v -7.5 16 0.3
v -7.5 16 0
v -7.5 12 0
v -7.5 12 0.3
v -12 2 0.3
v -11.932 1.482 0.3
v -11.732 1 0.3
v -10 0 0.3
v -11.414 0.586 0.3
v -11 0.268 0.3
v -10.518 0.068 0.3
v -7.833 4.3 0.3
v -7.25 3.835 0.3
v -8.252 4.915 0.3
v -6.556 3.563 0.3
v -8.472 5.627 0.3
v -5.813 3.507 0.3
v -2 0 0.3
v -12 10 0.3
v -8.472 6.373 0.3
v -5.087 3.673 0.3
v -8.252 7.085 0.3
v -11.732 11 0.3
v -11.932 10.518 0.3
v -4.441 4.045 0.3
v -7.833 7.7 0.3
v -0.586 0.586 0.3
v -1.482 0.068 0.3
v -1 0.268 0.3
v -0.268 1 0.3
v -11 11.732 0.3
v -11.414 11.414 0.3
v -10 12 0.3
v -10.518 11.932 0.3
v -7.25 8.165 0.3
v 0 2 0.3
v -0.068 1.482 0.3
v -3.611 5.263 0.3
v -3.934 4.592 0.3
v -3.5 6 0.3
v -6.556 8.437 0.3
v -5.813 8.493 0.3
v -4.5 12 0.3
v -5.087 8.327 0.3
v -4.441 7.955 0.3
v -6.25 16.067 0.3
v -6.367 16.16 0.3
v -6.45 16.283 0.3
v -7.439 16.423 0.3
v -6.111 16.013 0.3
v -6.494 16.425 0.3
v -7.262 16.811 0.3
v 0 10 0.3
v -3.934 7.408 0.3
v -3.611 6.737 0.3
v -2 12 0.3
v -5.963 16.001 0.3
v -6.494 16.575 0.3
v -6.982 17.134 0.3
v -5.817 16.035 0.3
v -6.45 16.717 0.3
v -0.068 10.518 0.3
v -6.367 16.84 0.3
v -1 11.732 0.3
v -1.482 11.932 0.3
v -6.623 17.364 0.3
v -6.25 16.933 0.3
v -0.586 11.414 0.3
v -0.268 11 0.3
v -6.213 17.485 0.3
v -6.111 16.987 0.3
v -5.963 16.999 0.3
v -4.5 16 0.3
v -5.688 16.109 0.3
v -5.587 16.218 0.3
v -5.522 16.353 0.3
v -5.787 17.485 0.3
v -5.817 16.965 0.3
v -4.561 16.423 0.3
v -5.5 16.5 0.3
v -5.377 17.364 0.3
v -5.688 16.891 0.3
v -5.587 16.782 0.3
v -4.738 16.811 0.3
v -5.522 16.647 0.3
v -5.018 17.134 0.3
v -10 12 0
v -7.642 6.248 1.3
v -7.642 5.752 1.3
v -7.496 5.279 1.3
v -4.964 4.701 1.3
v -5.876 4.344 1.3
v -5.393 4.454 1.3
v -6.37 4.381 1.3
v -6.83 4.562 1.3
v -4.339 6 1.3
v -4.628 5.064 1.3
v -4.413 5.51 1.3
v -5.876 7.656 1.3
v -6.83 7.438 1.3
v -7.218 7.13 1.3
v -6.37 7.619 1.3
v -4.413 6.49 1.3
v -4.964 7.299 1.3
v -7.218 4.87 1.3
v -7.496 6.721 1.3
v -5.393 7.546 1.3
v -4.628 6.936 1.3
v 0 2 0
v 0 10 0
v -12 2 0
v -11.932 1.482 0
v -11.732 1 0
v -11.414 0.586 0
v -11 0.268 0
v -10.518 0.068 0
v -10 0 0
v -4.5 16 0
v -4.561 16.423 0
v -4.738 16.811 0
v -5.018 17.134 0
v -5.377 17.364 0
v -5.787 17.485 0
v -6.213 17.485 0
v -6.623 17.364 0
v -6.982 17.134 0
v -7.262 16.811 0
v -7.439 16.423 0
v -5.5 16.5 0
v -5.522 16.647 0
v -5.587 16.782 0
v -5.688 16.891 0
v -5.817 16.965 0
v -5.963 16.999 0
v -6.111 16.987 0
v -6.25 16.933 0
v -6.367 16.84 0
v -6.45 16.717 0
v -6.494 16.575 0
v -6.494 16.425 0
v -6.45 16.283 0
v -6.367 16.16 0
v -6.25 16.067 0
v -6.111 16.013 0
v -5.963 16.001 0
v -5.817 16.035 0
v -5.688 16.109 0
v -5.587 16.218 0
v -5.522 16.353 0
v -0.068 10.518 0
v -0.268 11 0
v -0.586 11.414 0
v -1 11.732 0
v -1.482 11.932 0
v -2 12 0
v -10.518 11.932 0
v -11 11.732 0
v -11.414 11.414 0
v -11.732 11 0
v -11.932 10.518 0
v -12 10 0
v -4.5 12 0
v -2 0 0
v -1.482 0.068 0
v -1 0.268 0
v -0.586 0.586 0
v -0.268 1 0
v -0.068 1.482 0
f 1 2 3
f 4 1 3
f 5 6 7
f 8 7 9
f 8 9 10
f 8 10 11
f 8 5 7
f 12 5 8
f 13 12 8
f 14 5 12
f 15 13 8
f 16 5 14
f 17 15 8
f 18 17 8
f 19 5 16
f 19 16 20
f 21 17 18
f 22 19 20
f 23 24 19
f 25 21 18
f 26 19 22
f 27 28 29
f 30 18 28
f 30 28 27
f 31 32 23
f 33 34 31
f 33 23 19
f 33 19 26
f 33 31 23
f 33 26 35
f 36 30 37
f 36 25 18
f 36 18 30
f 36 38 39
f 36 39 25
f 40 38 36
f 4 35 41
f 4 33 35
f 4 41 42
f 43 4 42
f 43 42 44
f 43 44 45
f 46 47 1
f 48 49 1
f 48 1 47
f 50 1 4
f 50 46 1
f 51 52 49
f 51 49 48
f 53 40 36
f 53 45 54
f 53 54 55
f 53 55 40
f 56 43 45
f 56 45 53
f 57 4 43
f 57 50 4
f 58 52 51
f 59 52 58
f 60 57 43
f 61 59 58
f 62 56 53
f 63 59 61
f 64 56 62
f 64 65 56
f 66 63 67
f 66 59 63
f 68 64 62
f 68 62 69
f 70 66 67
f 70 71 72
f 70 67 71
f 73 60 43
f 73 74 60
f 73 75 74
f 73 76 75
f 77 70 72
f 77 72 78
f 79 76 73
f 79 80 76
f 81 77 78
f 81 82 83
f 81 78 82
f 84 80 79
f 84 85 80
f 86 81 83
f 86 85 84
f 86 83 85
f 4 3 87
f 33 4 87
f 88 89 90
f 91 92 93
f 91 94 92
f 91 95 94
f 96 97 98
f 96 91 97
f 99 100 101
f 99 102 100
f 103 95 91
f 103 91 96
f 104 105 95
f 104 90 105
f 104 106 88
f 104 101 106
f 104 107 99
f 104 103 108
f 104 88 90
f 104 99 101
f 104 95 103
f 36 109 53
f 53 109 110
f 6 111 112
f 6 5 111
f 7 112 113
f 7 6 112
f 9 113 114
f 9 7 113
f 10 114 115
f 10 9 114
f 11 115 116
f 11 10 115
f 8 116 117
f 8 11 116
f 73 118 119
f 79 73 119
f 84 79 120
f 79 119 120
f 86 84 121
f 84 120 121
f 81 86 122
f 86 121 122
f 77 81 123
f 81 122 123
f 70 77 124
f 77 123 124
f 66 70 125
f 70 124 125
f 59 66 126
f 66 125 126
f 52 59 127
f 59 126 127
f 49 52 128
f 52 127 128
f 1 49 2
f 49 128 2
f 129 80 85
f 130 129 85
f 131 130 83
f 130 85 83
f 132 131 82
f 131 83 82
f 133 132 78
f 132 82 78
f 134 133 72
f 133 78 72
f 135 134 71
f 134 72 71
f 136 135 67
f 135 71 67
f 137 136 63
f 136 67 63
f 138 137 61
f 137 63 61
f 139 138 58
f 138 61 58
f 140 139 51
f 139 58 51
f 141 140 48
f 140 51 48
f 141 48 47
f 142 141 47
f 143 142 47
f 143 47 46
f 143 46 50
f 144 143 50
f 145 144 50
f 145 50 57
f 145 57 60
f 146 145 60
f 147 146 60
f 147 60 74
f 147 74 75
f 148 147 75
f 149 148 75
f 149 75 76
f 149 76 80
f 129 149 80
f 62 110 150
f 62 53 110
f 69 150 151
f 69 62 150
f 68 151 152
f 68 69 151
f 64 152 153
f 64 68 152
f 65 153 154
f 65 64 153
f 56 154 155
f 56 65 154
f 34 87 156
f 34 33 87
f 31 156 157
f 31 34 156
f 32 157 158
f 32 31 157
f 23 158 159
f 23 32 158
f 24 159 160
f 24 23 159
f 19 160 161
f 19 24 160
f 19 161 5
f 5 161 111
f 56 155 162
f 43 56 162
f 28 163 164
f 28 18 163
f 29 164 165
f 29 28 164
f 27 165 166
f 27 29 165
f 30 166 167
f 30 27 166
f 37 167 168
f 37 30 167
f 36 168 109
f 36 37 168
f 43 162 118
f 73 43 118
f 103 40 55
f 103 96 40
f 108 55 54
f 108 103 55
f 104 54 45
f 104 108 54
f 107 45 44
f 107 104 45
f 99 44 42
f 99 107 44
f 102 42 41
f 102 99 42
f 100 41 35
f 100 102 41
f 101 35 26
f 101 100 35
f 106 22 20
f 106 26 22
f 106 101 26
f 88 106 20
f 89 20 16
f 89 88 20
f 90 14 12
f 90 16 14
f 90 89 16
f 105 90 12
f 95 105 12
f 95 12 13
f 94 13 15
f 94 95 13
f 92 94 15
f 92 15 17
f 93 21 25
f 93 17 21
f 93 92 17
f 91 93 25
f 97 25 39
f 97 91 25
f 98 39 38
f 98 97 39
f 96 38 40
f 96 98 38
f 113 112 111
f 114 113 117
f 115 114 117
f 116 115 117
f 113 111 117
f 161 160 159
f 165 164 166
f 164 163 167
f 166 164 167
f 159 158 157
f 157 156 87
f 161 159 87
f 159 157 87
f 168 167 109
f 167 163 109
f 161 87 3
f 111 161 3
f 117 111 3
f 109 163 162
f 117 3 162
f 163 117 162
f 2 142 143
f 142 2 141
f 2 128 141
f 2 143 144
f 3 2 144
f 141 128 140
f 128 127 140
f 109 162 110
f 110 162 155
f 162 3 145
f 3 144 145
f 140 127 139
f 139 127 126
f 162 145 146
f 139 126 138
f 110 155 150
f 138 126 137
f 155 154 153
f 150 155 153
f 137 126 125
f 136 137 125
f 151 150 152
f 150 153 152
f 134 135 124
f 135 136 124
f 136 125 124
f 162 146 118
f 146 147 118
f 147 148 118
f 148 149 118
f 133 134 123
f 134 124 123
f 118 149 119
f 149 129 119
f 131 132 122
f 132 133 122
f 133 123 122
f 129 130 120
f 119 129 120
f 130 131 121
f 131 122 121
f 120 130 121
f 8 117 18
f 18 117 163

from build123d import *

# Parameters (mm, degrees)
EXTRUDE_1_DEPTH     = 0.3
FILLET_1_R          = 2
SKETCH_2_R          = 2.5
EXTRUDE_2_DEPTH     = 1
EXTRUDE_2_TAPER     = 40
SKETCH_3_R          = 0.5
CUT_EXTRUDE_1_DEPTH = 1


with BuildPart() as part:
    # 草图1 → 凸台-拉伸1 (new body)
    with BuildSketch(Plane.XY):
        with BuildLine():
            Line((-7.5, 12), (-12, 12))
            Line((-12, 12), (-12, 0))
            Line((-12, 0), (0, 0))
            Line((0, 0), (0, 12))
            Line((0, 12), (-4.5, 12))
            Line((-4.5, 12), (-4.5, 16))
            ThreePointArc((-4.5, 16), (-6, 17.5), (-7.5, 16))
            Line((-7.5, 16), (-7.5, 12))
        make_face()
    extrude(amount=EXTRUDE_1_DEPTH)

    # 圆角1
    fillet_1_edges = [part.edges().sort_by_distance(p)[0] for p in [
        (0, 0, 0.15),
        (-12, 0, 0.15),
        (-12, 12, 0.15),
        (0, 12, 0.15),
    ]]
    fillet(fillet_1_edges, radius=FILLET_1_R)

    # 草图2 → 凸台-拉伸2 (add)
    with BuildSketch(Plane.XY.offset(0.3)):
        with Locations((-6, 6)):
            Circle(SKETCH_2_R)
    extrude(amount=EXTRUDE_2_DEPTH, taper=EXTRUDE_2_TAPER)

    # 草图3 → 切除-拉伸1 (cut)
    with BuildSketch(Plane.XY.offset(0.3)):
        with Locations((-6, 16.5)):
            Circle(SKETCH_3_R)
    extrude(amount=-CUT_EXTRUDE_1_DEPTH, mode=Mode.SUBTRACT)


solid = part.part
